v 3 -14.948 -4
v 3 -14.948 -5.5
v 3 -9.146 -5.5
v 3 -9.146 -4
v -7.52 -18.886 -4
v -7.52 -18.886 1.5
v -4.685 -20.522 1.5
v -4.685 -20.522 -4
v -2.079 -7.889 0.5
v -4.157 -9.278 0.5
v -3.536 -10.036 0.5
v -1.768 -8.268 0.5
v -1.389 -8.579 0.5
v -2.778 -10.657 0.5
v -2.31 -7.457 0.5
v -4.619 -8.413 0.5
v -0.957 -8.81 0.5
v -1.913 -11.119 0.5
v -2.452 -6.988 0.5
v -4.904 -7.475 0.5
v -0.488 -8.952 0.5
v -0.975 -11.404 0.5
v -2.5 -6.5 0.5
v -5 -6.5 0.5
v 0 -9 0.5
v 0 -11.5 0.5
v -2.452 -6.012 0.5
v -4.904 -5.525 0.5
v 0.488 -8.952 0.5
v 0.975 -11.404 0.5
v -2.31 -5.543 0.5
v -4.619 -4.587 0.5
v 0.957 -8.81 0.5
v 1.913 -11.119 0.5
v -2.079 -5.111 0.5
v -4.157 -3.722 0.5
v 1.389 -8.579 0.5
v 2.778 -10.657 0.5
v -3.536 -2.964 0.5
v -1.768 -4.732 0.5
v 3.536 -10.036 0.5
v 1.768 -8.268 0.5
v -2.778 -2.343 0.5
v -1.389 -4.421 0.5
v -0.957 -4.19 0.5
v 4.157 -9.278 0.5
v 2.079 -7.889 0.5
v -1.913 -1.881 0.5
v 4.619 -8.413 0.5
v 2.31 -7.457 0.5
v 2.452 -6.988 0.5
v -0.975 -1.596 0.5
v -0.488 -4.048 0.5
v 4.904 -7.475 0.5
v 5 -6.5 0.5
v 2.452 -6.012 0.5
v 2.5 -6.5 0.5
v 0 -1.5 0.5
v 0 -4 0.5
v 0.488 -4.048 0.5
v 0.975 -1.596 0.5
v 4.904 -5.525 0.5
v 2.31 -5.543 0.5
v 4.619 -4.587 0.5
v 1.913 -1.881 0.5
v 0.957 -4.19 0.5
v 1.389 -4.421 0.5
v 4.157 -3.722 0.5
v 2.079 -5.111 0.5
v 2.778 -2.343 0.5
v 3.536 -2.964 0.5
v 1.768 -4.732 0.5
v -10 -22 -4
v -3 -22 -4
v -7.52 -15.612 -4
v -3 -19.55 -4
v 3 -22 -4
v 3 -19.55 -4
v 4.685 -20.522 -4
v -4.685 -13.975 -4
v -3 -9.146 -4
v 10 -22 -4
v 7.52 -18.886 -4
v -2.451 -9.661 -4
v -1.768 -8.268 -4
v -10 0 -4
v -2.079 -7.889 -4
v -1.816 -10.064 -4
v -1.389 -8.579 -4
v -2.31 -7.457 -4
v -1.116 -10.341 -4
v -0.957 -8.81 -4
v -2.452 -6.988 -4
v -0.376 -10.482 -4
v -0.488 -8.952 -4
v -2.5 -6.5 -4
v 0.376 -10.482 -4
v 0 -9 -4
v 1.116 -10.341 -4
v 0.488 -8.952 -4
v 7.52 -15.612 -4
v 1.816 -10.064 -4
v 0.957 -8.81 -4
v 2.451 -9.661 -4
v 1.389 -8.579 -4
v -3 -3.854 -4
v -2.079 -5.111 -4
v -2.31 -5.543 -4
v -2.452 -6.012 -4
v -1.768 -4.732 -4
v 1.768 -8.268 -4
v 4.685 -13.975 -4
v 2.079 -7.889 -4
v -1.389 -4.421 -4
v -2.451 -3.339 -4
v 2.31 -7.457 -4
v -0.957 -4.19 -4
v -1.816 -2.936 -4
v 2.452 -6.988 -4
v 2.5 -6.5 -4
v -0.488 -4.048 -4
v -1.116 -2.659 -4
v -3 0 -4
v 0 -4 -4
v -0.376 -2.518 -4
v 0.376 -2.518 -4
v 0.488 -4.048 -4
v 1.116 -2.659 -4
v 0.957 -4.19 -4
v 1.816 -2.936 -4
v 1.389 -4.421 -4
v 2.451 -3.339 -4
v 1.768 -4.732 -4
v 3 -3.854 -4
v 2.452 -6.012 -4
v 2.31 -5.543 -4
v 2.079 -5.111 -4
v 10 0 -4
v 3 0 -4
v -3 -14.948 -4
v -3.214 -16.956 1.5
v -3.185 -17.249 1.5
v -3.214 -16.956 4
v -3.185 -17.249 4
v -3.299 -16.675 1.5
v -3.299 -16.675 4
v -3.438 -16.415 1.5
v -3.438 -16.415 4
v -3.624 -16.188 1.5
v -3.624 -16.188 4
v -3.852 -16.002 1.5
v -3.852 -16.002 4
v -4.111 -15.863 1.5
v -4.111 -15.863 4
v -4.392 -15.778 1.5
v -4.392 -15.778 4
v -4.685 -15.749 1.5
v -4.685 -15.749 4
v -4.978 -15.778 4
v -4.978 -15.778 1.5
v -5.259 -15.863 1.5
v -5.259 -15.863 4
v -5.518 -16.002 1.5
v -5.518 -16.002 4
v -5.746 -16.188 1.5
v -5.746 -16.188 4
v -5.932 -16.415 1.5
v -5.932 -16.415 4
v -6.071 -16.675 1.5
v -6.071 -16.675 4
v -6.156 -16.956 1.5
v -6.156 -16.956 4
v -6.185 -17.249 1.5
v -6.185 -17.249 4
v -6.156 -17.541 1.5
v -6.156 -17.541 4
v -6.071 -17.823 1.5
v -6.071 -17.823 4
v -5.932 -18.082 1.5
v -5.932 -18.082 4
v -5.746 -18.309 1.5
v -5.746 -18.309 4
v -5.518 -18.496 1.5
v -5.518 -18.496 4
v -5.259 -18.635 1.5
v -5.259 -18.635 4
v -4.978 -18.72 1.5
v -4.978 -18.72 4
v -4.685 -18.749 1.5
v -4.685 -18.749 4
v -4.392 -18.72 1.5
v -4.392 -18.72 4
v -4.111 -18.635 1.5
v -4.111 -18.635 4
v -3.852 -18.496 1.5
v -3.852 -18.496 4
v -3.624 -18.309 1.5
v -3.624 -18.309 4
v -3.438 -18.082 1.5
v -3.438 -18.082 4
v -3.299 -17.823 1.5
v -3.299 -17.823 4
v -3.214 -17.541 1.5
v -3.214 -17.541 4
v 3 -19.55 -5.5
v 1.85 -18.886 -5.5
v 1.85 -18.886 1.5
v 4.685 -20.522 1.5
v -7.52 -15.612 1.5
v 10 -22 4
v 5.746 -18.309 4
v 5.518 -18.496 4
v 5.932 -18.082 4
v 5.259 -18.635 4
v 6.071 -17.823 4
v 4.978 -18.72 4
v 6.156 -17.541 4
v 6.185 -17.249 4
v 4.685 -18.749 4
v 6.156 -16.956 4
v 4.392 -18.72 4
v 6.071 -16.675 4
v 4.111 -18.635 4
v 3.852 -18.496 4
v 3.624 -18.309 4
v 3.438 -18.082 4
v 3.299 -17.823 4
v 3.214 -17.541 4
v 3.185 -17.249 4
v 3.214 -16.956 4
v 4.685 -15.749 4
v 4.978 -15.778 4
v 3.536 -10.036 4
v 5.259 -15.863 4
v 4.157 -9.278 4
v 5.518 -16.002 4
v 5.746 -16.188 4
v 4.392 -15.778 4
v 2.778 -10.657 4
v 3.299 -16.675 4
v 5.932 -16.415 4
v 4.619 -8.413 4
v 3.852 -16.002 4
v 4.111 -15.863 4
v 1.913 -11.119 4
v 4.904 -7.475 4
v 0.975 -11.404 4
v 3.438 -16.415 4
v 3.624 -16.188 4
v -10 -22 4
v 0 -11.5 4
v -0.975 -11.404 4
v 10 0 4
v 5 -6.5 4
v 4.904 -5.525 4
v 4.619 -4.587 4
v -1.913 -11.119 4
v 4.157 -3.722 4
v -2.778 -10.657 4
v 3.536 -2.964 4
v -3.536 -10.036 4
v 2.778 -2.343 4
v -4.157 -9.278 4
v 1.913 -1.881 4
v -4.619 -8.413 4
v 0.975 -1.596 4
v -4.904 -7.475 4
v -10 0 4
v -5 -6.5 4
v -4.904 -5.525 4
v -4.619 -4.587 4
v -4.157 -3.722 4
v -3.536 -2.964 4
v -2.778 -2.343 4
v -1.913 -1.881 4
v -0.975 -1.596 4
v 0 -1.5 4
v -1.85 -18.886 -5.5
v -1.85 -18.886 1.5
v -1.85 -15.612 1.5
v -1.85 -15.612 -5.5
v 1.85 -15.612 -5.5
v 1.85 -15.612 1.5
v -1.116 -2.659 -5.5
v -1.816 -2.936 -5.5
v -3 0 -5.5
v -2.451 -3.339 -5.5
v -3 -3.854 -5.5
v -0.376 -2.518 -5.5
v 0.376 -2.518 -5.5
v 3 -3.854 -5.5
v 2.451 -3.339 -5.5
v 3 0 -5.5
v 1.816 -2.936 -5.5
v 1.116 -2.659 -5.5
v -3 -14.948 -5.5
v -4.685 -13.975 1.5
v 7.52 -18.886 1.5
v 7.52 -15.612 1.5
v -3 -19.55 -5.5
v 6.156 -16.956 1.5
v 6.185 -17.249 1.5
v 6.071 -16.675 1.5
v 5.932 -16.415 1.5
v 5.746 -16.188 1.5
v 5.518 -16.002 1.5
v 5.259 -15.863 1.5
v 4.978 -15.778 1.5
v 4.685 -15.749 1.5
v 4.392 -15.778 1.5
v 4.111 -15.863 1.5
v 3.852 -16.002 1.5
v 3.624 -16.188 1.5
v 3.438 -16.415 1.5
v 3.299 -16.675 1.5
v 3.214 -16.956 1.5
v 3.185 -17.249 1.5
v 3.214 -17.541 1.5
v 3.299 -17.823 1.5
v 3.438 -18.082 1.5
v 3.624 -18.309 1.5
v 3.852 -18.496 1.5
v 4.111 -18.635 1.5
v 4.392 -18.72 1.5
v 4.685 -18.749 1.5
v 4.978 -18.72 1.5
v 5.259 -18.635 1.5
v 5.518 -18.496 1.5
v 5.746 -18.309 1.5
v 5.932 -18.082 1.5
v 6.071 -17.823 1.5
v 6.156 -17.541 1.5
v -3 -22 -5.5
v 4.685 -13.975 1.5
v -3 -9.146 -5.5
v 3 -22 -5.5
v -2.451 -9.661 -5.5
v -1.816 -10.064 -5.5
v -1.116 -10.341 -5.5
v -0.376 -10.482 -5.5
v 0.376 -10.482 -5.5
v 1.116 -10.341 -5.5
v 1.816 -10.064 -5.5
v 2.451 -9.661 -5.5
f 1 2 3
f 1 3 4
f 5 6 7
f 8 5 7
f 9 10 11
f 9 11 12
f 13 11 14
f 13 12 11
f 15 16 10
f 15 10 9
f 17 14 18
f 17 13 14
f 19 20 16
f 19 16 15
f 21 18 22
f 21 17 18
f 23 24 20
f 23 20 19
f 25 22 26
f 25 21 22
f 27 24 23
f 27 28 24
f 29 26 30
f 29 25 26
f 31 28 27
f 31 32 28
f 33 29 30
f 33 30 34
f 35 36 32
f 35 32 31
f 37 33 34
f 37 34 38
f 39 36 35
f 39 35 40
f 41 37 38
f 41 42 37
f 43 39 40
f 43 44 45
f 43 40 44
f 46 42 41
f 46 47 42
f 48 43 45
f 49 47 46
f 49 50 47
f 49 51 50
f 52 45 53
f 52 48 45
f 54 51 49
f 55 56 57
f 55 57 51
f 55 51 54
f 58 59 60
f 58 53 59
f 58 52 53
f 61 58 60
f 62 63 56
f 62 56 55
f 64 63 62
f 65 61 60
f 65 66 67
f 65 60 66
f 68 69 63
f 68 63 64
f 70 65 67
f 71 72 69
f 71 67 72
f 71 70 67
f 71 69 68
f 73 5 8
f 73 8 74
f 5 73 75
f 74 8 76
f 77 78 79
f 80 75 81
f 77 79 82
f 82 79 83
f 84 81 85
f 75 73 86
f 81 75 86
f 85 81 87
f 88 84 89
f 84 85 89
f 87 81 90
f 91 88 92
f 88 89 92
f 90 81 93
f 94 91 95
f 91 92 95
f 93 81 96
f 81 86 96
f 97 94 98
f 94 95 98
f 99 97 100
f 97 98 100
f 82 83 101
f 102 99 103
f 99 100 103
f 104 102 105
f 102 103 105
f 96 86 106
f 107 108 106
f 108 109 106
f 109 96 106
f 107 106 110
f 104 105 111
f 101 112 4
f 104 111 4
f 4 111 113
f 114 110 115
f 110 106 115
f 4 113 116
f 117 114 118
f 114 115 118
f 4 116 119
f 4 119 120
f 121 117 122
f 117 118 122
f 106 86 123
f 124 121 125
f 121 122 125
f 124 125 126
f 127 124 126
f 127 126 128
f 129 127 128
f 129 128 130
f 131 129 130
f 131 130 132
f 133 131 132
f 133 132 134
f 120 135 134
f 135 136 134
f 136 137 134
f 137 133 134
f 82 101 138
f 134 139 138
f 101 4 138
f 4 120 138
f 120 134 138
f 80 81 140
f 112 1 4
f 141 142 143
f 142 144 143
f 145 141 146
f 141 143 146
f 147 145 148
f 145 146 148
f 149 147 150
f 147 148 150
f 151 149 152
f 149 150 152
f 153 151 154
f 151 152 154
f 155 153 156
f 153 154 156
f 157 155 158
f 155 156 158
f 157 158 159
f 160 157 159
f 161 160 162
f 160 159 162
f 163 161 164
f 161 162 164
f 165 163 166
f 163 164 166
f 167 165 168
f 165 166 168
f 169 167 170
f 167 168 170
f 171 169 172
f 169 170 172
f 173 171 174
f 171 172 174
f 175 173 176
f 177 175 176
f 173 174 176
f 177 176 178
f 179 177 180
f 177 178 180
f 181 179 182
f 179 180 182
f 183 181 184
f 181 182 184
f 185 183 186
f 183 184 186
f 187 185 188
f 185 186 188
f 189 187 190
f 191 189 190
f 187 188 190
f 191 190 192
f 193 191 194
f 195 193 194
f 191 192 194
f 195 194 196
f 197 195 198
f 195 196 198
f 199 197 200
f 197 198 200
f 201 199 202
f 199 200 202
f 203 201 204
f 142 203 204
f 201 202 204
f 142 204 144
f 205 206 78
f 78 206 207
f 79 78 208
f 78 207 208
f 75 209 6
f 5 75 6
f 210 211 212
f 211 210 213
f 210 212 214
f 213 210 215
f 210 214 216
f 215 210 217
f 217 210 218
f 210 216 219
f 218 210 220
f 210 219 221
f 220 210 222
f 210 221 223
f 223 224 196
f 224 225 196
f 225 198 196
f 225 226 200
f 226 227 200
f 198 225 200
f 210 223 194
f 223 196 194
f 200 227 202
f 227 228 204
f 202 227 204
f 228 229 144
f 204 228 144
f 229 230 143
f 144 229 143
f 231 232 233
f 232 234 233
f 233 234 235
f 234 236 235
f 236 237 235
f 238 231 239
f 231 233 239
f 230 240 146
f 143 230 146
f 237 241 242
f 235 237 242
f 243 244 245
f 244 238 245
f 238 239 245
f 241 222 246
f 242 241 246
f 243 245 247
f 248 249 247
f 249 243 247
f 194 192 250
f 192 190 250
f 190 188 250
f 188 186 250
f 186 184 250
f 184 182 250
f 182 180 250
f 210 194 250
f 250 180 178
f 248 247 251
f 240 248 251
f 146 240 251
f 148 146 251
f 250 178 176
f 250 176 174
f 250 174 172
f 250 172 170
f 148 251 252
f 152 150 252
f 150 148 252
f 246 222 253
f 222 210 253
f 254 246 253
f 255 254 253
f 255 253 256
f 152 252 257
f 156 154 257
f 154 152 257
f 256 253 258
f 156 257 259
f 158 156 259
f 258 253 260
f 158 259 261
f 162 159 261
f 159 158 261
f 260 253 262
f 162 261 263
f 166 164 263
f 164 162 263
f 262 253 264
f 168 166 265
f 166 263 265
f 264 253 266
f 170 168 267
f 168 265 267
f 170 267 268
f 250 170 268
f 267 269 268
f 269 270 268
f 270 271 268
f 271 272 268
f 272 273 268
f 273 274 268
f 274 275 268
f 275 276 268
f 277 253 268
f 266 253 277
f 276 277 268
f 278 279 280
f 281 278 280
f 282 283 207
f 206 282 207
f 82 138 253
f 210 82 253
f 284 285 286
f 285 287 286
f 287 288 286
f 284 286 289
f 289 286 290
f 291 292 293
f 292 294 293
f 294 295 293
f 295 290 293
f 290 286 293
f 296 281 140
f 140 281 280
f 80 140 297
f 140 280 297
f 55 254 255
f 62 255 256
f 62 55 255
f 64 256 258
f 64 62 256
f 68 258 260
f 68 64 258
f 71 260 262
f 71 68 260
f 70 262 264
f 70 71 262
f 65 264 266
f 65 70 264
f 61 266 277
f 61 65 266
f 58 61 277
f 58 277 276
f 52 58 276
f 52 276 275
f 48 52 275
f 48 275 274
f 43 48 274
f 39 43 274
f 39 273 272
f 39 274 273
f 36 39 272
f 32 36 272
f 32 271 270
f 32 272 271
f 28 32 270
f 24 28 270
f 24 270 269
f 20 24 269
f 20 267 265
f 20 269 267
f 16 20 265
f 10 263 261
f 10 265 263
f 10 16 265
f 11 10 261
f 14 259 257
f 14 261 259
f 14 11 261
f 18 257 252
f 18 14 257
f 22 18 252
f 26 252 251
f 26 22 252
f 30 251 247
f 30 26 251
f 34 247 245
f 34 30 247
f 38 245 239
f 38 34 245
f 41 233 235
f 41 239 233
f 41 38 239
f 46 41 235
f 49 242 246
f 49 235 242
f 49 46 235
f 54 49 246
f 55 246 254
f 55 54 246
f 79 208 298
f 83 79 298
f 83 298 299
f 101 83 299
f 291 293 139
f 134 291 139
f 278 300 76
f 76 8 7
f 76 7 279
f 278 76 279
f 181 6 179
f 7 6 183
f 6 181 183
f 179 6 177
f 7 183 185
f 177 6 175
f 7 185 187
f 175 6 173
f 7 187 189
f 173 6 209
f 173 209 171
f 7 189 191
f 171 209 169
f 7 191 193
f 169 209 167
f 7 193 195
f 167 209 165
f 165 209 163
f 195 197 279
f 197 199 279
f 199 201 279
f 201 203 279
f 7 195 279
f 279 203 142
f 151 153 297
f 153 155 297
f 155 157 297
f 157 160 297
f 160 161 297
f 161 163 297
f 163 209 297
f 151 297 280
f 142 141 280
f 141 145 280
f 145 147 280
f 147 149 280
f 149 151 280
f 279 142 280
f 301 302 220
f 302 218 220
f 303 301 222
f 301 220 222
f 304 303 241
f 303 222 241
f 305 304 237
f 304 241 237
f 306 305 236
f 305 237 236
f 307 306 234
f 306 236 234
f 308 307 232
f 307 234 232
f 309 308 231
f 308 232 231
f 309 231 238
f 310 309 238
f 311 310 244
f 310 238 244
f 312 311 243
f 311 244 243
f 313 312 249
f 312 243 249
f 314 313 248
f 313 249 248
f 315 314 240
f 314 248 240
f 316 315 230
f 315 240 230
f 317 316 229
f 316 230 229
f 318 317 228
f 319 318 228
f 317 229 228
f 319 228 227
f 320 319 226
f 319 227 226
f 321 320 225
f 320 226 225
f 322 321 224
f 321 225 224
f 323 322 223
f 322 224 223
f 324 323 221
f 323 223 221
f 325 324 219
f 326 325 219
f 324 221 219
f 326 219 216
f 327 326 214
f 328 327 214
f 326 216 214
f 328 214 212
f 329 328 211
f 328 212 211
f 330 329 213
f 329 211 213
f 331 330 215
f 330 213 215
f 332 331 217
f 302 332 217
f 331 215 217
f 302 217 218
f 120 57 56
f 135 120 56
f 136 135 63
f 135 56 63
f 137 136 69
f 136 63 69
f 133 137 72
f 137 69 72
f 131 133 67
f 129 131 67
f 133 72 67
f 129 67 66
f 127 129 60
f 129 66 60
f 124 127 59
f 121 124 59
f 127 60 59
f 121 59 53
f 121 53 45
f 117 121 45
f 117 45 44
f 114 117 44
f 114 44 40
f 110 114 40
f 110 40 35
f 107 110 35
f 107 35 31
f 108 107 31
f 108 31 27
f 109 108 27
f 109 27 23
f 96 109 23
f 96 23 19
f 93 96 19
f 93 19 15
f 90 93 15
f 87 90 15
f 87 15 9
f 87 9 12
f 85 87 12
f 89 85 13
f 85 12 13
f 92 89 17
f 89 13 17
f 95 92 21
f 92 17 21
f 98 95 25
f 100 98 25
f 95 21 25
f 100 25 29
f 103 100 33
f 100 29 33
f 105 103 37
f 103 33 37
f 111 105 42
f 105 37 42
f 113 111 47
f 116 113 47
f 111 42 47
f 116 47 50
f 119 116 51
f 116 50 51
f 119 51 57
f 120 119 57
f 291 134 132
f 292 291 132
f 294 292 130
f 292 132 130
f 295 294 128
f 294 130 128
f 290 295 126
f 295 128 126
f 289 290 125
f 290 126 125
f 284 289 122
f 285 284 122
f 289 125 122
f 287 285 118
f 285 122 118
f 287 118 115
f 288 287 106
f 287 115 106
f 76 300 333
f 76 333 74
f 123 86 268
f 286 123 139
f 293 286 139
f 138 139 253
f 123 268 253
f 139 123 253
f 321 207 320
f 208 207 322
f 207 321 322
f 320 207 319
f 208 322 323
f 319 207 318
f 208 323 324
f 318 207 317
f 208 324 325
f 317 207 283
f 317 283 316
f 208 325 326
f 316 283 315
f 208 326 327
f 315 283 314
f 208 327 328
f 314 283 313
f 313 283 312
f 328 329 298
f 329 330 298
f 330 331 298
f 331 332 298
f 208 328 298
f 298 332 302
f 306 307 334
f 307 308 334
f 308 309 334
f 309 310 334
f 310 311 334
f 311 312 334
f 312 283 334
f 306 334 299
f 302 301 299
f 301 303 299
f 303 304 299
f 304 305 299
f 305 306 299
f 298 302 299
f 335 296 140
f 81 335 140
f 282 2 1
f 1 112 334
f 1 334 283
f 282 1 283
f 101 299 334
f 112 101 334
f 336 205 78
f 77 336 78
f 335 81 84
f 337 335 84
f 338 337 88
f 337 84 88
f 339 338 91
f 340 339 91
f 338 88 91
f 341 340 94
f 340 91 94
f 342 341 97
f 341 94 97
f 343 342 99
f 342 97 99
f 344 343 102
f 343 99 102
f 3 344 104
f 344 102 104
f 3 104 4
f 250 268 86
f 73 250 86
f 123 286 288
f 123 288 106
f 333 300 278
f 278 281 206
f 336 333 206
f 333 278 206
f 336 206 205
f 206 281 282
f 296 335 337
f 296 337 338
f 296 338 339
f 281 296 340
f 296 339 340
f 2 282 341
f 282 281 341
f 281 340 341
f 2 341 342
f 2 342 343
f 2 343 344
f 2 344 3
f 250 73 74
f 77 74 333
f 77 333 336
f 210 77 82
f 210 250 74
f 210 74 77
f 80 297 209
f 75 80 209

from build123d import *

# Parameters (mm, degrees)
F0_W          = 6
F0_H          = 1.5
F1_DEPTH      = 22
F2_R          = 2.5
F3_DEPTH      = 25
F3_DEPTH_BACK = 25
F4_START      = 0.5
F2_R_2        = 5
F2_R_3        = 4
F4_DEPTH      = 24.5
F2_R_4        = 1.5
F5_DEPTH      = 25
F5_DEPTH_BACK = 25
F6_DEPTH      = 25
F6_DEPTH_BACK = 1.5
F7_START      = -4
F7_DEPTH      = 21


with BuildPart() as f1:
    # F0 (on Front) → F1 (new body)
    with BuildSketch(Plane.XZ):
        with Locations((0, -4.75)):
            Rectangle(F0_W, F0_H)
        Polygon((3, -4), (10, -4), (10, 4), (-10, 4), (-10, -4), (-3, -4), align=None)
    extrude(amount=F1_DEPTH)

    # F2 (on Top) → F3 (cut, two sides)
    with BuildSketch(Plane.XY) as f3_sk:
        with Locations((0, -6.5)):
            Circle(F2_R)
    extrude(amount=F3_DEPTH, mode=Mode.SUBTRACT)
    extrude(f3_sk.sketch, amount=-F3_DEPTH_BACK, mode=Mode.SUBTRACT)

    # F2 (on Top) → F4 (cut)
    with BuildSketch(Plane.XY.offset(F4_START)):
        with Locations((0, -6.5)):
            Circle(F2_R_2)
        with Locations((0, -6.5)):
            Circle(F2_R_3, mode=Mode.SUBTRACT)
        with Locations((0, -6.5)):
            Circle(F2_R_3)
        with Locations((0, -6.5)):
            Circle(F2_R, mode=Mode.SUBTRACT)
    extrude(amount=F4_DEPTH, mode=Mode.SUBTRACT)

    # F2 (on Top) → F5 (cut, two sides)
    with BuildSketch(Plane.XY) as f5_sk:
        with Locations((-4.685, -17.2488261014)):
            Circle(F2_R_4)
        with Locations((4.685, -17.2488261014)):
            Circle(F2_R_4)
    extrude(amount=F5_DEPTH, mode=Mode.SUBTRACT)
    extrude(f5_sk.sketch, amount=-F5_DEPTH_BACK, mode=Mode.SUBTRACT)

    # F2 (on Top) → F6 (cut, two sides)
    with BuildSketch(Plane.XY) as f6_sk:
        Polygon((-1.85, -18.8856141146), (-1.85, -15.6120380883), (-4.685, -13.9752500751), (-7.52, -15.6120380883), (-7.52, -18.8856141146), (-4.685, -20.5224021277), align=None)
        with Locations((-4.685, -17.2488261014)):
            Circle(F2_R_4, mode=Mode.SUBTRACT)
        Polygon((7.52, -18.8856141146), (7.52, -15.6120380883), (4.685, -13.9752500751), (1.85, -15.6120380883), (1.85, -18.8856141146), (4.685, -20.5224021277), align=None)
        with Locations((4.685, -17.2488261014)):
            Circle(F2_R_4, mode=Mode.SUBTRACT)
    extrude(amount=-F6_DEPTH, mode=Mode.SUBTRACT)
    extrude(f6_sk.sketch, amount=F6_DEPTH_BACK, mode=Mode.SUBTRACT)

    # F2 (on Top) → F7 (cut)
    with BuildSketch(Plane.XY.offset(F7_START)):
        with Locations((0, -6.5)):
            Circle(F2_R_3)
        with Locations((0, -6.5)):
            Circle(F2_R, mode=Mode.SUBTRACT)
    extrude(amount=-F7_DEPTH, mode=Mode.SUBTRACT)


solid = f1.part
